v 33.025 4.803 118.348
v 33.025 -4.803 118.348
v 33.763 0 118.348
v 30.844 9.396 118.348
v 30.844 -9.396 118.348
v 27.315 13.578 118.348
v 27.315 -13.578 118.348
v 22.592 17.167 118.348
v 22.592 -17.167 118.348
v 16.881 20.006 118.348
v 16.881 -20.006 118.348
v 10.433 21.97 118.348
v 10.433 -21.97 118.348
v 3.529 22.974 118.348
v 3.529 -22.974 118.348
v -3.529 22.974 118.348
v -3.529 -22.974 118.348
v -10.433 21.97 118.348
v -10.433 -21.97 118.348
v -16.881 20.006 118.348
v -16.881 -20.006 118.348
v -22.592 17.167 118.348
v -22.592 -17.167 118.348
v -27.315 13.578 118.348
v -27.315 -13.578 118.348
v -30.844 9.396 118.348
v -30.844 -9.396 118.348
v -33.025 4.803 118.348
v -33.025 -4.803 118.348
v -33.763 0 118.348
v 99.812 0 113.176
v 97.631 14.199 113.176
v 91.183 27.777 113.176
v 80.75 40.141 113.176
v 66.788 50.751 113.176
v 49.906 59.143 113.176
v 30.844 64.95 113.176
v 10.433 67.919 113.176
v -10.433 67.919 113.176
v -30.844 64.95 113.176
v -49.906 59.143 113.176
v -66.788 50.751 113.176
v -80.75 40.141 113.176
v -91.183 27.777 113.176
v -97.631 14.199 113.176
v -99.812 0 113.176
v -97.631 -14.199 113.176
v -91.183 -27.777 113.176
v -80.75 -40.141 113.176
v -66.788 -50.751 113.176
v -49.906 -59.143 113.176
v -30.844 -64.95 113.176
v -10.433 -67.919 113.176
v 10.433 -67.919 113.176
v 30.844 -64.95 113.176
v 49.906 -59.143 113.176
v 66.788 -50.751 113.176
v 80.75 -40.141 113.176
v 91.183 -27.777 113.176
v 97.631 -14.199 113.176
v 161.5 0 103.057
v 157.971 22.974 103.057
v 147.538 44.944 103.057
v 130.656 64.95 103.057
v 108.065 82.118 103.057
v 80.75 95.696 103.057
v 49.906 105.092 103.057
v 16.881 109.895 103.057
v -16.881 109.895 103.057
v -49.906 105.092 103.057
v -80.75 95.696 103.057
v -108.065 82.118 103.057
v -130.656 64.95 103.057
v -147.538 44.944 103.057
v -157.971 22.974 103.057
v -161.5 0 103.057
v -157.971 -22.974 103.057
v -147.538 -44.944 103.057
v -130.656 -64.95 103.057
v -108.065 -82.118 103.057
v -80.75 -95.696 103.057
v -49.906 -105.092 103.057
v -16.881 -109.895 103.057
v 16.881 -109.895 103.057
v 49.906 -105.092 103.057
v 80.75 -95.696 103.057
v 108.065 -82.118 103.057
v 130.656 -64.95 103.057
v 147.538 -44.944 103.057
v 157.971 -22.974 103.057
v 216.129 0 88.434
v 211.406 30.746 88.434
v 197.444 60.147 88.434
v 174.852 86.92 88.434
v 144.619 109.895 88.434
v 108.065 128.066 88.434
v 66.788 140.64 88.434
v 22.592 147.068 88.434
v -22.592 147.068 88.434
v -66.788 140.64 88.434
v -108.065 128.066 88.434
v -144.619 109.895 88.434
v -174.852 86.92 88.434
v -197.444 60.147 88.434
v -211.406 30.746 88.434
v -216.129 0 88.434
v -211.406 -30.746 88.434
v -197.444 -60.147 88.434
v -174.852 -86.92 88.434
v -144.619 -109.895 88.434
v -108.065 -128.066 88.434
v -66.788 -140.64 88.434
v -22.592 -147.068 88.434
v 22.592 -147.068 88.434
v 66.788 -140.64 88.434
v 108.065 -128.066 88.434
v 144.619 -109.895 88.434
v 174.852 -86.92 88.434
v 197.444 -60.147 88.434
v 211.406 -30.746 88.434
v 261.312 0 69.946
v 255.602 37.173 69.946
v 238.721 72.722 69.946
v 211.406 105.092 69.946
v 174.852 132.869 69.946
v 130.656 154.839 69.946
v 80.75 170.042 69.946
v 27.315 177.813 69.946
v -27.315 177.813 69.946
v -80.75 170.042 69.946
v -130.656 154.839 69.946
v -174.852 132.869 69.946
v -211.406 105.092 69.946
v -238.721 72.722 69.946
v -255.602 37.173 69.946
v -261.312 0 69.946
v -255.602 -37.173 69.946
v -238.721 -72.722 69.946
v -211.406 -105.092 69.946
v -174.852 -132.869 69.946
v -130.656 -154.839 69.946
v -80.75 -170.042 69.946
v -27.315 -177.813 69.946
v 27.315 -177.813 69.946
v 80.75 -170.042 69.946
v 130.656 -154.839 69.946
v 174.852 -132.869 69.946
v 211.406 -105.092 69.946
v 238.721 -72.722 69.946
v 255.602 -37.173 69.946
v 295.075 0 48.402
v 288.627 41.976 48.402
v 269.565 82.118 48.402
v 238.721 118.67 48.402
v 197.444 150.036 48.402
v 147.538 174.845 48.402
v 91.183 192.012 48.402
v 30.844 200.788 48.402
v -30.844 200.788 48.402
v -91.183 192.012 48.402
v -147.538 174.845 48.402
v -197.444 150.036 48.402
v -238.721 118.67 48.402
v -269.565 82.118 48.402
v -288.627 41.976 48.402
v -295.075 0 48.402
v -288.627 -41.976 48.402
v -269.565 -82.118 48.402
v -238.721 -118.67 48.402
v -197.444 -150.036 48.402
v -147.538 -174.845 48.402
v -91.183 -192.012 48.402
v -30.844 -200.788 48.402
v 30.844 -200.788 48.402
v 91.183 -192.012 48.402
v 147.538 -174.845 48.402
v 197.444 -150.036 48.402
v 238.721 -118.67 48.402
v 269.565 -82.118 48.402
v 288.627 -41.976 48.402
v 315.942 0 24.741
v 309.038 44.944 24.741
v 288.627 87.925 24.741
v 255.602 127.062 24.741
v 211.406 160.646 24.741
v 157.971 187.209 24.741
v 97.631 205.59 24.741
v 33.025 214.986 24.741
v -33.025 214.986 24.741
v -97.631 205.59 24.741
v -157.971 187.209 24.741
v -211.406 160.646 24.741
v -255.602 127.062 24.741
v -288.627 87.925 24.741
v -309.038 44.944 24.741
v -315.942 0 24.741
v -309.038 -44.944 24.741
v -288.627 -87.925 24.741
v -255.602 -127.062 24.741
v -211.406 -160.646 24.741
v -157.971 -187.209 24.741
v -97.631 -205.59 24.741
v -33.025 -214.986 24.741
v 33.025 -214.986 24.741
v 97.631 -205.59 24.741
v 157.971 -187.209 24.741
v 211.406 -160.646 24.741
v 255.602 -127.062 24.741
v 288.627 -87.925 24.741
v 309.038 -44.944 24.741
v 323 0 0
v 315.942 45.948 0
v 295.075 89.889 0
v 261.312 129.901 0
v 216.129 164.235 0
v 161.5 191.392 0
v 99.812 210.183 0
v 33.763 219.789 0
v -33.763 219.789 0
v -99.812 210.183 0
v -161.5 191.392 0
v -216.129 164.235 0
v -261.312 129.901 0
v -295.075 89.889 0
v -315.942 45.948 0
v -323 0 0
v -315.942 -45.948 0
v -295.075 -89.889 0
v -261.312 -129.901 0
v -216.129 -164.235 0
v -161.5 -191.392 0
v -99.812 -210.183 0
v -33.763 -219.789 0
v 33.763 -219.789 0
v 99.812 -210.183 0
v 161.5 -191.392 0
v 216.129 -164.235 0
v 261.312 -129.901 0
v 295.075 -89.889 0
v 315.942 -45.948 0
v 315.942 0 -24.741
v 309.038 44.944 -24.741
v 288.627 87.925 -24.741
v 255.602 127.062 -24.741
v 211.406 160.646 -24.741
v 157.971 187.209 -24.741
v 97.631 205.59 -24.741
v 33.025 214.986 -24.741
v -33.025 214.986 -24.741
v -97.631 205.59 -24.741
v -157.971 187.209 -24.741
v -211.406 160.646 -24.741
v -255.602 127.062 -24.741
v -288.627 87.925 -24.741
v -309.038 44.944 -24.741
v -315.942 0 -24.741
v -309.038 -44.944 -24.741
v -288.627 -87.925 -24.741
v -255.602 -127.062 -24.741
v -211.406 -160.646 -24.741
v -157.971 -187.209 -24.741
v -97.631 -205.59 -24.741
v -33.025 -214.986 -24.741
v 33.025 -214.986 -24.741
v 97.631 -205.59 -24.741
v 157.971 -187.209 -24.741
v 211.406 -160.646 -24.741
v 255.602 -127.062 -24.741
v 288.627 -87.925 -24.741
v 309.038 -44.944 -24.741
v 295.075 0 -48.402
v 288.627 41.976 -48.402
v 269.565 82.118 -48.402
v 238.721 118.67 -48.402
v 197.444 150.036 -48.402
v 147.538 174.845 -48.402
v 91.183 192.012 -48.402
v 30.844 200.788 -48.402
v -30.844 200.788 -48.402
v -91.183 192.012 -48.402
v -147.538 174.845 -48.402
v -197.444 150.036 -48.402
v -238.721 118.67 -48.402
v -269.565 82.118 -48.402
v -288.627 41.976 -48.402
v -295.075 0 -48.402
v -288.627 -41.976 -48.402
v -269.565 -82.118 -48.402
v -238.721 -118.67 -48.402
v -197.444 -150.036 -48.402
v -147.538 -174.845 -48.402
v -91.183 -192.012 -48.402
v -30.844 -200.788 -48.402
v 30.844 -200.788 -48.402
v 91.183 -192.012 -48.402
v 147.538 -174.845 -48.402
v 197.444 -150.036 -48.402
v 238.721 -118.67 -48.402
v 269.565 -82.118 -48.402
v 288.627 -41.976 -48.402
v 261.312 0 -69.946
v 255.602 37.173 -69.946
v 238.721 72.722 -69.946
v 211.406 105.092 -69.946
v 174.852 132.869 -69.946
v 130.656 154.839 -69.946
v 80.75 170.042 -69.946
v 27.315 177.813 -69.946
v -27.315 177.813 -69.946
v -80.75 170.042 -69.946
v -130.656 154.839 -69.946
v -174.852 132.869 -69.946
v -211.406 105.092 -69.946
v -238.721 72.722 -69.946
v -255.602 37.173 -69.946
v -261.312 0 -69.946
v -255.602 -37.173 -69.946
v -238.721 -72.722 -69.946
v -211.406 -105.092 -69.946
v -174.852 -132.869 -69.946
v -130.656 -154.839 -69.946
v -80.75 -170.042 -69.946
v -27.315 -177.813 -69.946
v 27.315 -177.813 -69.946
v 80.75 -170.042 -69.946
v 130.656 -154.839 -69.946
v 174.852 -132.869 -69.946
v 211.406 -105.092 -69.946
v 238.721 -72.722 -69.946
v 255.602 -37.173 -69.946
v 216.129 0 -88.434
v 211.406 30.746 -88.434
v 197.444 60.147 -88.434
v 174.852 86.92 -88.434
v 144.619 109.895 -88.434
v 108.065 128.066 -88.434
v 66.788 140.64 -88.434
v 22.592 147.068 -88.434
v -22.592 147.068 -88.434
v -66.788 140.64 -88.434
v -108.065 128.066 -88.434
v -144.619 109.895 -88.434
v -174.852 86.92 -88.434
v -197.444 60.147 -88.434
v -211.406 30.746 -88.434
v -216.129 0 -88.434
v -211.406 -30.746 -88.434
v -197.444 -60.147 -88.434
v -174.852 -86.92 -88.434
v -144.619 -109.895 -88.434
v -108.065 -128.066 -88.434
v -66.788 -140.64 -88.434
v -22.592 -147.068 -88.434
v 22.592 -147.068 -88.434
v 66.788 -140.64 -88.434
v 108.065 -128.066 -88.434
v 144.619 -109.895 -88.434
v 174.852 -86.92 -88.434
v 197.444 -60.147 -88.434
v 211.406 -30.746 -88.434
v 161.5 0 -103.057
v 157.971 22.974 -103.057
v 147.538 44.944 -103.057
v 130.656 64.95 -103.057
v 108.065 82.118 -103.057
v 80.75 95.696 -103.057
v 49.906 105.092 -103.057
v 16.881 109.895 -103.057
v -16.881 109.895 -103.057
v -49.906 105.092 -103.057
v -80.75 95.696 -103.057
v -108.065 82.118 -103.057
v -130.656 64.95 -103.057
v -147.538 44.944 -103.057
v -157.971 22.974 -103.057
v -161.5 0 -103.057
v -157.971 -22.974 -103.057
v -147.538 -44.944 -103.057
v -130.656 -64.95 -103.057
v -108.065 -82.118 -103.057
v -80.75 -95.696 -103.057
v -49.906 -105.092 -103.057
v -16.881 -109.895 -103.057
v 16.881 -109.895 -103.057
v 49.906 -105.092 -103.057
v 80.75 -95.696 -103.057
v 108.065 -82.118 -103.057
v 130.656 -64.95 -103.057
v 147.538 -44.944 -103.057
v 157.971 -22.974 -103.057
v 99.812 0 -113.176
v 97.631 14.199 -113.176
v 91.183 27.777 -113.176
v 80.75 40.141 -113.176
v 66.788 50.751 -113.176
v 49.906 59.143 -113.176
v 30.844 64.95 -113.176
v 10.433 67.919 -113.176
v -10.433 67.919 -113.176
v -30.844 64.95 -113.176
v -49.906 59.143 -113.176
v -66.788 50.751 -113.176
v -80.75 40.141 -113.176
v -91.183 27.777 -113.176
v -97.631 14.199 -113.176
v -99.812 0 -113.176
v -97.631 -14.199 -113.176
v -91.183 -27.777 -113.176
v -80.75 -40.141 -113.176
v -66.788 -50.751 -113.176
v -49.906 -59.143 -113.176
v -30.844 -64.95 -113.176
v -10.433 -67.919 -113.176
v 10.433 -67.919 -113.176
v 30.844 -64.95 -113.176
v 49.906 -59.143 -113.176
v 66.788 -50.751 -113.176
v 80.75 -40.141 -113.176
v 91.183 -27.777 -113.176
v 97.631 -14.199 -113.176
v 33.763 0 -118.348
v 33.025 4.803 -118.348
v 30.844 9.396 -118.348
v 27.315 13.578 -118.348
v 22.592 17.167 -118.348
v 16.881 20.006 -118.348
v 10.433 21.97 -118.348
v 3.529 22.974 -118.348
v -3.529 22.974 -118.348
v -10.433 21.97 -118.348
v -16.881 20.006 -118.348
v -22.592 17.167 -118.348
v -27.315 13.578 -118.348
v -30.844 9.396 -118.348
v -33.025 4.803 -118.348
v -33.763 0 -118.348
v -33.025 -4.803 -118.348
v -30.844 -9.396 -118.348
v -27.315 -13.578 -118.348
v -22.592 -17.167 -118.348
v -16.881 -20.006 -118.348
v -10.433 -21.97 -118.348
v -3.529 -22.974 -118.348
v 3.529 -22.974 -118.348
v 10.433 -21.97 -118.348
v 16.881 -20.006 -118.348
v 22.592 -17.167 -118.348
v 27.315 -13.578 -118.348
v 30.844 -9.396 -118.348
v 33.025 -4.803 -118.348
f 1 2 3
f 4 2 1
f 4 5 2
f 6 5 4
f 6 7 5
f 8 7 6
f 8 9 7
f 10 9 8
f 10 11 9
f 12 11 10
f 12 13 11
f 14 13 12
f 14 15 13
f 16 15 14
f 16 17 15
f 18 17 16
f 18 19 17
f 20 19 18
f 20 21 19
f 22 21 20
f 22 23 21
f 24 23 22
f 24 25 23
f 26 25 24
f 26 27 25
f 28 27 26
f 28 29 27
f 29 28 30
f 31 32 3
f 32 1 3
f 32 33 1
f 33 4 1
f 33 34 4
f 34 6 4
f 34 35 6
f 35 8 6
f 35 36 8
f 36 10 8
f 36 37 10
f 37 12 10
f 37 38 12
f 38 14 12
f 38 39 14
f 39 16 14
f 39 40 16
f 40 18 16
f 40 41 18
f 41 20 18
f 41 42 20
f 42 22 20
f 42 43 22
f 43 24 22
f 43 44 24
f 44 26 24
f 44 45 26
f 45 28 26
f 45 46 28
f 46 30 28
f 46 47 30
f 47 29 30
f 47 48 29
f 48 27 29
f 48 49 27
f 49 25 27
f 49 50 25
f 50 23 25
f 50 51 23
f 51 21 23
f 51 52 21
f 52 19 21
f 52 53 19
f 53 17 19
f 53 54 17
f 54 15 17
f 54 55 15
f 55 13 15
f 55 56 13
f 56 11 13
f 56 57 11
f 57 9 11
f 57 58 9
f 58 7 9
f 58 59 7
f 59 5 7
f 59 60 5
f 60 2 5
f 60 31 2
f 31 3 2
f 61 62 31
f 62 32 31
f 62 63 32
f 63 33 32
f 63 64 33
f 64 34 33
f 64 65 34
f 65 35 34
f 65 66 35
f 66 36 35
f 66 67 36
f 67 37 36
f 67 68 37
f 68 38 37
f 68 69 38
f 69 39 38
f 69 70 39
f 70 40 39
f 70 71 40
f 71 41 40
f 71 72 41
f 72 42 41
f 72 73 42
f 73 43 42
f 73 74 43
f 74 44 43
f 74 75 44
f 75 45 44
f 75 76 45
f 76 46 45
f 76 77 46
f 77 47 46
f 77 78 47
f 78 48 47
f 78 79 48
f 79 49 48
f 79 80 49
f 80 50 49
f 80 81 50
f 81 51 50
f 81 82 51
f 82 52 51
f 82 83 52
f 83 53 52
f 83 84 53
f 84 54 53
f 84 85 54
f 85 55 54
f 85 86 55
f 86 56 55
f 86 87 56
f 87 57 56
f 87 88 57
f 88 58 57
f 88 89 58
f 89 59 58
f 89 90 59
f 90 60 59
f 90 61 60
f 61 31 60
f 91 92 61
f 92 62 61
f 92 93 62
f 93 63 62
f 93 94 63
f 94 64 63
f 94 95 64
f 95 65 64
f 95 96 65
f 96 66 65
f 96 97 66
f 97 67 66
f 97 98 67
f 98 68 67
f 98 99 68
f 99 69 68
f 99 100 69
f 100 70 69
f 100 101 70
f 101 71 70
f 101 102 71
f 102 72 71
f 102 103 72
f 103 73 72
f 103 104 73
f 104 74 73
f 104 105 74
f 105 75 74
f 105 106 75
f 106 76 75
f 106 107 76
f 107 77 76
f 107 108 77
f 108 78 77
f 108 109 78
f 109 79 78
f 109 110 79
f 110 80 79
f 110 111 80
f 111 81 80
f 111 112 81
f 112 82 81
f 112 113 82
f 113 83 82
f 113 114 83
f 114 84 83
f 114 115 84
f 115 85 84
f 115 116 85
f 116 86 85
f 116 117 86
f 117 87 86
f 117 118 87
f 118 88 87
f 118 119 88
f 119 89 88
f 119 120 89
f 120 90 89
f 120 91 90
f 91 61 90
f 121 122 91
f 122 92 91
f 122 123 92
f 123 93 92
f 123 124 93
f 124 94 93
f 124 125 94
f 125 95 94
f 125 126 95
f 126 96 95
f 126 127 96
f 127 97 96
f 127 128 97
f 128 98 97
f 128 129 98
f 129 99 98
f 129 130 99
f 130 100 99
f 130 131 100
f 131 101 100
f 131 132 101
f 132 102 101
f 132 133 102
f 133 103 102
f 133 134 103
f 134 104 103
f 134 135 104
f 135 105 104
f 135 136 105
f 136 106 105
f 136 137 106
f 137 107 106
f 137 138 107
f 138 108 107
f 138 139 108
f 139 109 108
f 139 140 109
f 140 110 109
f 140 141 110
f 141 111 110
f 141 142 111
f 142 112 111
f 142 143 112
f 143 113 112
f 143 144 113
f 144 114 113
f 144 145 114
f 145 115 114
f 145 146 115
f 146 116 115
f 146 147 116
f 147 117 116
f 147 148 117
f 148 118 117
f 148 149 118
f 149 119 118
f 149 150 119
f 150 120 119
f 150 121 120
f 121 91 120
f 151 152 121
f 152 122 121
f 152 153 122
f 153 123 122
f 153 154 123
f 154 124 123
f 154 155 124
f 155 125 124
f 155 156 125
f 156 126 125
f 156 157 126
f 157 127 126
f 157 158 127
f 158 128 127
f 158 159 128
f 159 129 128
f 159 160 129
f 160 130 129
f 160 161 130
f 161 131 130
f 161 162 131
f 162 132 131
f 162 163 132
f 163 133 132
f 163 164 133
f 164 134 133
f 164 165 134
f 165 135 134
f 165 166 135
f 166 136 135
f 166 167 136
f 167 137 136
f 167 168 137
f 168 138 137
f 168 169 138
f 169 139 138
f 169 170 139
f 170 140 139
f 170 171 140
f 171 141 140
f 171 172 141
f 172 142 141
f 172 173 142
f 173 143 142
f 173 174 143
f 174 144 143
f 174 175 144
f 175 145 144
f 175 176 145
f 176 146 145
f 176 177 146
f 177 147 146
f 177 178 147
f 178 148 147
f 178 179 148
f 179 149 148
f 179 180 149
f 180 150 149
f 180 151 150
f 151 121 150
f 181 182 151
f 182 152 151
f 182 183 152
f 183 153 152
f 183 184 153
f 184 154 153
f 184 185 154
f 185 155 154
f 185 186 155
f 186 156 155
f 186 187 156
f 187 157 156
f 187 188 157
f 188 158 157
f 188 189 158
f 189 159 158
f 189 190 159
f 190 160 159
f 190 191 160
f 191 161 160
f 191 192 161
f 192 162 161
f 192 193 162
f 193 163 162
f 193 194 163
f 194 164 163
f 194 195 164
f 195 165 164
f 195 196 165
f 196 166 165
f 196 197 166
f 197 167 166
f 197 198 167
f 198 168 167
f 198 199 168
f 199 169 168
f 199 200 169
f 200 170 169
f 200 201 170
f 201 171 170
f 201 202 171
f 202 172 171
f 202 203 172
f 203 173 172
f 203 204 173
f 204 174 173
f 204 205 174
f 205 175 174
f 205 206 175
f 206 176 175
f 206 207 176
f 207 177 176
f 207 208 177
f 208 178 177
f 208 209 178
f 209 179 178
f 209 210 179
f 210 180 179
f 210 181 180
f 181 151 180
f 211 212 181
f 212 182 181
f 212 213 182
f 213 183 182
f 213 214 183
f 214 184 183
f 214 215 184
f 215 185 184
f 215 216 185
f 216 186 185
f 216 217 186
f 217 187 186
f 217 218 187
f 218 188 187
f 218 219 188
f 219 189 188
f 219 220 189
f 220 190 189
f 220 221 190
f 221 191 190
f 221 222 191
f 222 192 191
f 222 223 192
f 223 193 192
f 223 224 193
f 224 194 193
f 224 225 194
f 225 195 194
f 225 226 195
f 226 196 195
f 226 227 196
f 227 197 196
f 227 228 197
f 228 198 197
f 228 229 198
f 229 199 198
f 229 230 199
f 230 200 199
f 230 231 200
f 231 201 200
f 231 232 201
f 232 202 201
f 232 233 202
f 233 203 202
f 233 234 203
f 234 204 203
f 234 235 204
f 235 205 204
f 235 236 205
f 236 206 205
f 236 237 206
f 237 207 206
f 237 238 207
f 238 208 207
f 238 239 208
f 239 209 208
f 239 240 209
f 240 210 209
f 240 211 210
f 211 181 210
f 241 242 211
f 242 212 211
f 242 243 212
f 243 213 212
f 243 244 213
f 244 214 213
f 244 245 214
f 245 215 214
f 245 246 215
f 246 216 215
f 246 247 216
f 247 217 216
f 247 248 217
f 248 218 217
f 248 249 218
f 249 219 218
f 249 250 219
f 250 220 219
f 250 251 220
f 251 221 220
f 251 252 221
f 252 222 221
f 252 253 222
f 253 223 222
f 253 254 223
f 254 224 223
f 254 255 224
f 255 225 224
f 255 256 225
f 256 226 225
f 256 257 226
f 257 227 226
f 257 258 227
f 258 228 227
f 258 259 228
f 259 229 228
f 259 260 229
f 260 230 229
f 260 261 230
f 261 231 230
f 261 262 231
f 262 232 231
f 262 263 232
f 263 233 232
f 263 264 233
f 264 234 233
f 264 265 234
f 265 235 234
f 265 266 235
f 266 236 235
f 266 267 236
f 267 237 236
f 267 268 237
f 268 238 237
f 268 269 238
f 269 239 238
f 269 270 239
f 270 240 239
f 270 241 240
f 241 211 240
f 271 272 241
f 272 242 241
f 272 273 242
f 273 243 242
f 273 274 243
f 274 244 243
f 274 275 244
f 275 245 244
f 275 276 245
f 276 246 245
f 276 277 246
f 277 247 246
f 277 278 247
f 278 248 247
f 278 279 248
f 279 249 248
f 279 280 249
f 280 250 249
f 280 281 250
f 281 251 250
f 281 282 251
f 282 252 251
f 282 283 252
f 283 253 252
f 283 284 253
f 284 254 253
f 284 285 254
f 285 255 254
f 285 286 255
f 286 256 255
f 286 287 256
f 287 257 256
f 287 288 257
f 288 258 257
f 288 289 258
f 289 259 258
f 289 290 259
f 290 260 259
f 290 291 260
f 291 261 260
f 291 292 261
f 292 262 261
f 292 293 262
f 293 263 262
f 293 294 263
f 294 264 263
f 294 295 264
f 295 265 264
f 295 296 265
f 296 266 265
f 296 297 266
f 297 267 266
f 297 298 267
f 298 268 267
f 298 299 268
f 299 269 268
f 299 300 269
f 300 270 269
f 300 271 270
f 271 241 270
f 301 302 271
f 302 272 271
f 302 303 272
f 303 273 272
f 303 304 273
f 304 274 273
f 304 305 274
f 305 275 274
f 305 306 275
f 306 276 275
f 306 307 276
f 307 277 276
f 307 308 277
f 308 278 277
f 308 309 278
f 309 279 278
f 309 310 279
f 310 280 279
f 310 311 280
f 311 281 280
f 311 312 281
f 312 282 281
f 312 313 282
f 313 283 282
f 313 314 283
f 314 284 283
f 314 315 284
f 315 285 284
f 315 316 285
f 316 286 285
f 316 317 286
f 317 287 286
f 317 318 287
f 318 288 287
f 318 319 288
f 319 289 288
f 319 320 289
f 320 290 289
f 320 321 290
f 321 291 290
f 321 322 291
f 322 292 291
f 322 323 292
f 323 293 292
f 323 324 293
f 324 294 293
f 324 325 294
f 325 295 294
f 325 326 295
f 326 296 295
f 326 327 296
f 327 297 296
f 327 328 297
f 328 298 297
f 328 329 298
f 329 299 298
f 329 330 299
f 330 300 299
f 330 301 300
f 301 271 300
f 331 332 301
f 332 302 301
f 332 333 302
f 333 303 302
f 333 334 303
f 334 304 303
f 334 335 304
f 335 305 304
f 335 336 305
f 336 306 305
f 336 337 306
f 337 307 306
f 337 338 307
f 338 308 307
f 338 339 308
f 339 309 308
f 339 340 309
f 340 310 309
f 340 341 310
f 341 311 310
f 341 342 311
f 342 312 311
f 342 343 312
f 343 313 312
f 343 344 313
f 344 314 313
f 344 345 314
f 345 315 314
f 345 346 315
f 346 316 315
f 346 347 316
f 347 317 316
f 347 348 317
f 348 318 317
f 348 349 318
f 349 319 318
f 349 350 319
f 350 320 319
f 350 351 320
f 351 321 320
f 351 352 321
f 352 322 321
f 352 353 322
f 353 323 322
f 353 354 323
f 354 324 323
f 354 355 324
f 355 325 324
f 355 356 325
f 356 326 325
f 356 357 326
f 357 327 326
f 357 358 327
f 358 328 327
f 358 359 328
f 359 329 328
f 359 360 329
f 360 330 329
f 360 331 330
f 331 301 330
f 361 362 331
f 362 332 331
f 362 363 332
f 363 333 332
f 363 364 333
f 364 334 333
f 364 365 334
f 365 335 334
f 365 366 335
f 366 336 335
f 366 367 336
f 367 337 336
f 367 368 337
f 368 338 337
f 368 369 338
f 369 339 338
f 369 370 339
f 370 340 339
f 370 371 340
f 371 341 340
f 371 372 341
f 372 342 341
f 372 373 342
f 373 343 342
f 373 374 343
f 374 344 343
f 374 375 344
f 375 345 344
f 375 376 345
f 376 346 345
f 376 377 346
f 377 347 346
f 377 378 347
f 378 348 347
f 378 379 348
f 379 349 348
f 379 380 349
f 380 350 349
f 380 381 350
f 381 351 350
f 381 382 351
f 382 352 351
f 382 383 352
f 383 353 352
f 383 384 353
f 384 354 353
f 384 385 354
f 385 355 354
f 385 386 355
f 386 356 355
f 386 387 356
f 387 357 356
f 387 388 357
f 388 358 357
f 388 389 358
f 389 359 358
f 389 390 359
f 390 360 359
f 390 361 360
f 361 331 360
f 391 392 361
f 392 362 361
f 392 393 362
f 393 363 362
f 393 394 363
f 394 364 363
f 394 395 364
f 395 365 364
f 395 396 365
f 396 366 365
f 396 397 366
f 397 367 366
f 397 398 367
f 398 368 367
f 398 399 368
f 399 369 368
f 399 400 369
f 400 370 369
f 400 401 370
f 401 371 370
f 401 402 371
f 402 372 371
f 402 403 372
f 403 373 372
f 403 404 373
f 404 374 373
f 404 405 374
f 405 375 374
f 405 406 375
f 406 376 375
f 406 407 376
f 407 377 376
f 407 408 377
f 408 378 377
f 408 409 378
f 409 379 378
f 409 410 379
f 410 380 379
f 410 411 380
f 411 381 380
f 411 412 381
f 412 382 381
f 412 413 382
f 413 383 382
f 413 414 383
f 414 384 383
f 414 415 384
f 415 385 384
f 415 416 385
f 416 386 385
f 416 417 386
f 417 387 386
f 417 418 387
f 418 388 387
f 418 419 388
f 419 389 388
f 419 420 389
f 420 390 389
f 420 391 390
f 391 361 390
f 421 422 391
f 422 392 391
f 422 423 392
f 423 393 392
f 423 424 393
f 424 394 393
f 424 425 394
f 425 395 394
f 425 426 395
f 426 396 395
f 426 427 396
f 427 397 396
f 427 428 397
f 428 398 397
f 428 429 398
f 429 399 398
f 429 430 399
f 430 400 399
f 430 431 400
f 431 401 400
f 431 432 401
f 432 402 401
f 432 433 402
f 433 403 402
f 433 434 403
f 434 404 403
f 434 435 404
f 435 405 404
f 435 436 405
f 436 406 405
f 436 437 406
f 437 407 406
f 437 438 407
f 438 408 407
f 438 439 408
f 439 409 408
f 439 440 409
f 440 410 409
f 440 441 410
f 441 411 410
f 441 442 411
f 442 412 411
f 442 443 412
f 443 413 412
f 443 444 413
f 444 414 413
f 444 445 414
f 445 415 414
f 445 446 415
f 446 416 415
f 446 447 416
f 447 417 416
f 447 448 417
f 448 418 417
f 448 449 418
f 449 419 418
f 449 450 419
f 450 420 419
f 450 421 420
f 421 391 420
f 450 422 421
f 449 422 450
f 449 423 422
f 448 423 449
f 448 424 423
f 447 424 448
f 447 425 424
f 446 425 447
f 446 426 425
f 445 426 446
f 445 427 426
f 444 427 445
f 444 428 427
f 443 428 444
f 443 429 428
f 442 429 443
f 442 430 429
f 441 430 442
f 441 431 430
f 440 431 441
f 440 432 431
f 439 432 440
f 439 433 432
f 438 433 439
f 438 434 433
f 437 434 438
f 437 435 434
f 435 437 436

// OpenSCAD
// Generated by SolidPython 1.0.1 on 2020-07-29 00:46:54


scale(v = [19, 13, 7]) {
	sphere(r = 17);
}
/***********************************************
*********      SolidPython code:      **********
************************************************
 
# import packages: SolidPython
from solid import *
from solid.utils import *
from itertools import chain, combinations, permutations


class Resize:

    def __init__(self, scad_file):
        self.scad_file = scad_file
        #self.scad_file = import_scad(scad_file)
        # cone/cylinder param:
        self.r1 = 0
        self.r2 = 0
        self.h = 0
        # rectangular prism param:
        self.w = 0
        self.l = 0
        # ellipse param:
        self.r = 0

    # import OpenScad code (file name corresponds to shape)


    # classify shape + parameters
    def assign(self, param1, param2, param3):
        if self.scad_file == 'cone.scad':
            self.r1 = param1
            self.r2 = param2
            self.h = param3
        elif self.scad_file == 'cylinder.scad':
            self.r1 = param1
            self.r2 = param2
            self.h = param3
        elif self.scad_file == 'rectangularPrism.scad':
            self.h = param1
            self.l = param2
            self.w = param3
        else:
            self.r = param1
            self.h = param2

    # resize parameters
    def iterate(self):
        x = range(3, 20, 2)
        i = 1
        if self.scad_file == 'cone.scad':
            tempList = list(permutations(x, 2))
            for temp in tempList:
                param1 = temp[0]
                param2 = temp[1]
                filepath = 'produced_scad_files/' + 'cone' + str(param1) + '_' + str(param2) + '_' + '.scad'
                scad_render_to_file(cylinder(h=param1, r1=param2, r2=0), filepath)

        elif self.scad_file == 'cylinder.scad':
            tempList = list(permutations(x, 3))
            for temp in tempList:
                param1 = temp[0]
                param2 = temp[1]
                filepath = 'produced_scad_files/' + 'cylinder' + str(param1) + '_' + str(param2) + '_' + '.scad'
                scad_render_to_file(cylinder(h=param1, r1=param2, r2=param2), filepath)

        elif self.scad_file == 'rectangularPrism.scad':
            tempList = list(permutations(x, 3))
            for temp in tempList:
                param1 = temp[0]
                param2 = temp[1]
                param3 = temp[2]
                filepath = 'produced_scad_files/' + 'rectangularPrism' + str(param1) + '_' + str(param2) + '_' + str(
                    param3) + '.scad'
                scad_render_to_file(cube(size=(param1, param2, param3)), filepath)

        elif self.scad_file == 'ellipse.scad':
            tempList = list(permutations(x, 4))
            for temp in tempList:
                param1 = temp[0]
                param2 = temp[1]
                param3 = temp[2]
                param4 = temp[3]
                filepath = 'produced_scad_files/' + 'ellipse' + str(param1) + '_' + str(param2) + '_' + str(param3) + '_' + str(param4) + '.scad'
                scad_render_to_file(scale([param1, param2, param3])(sphere(r=param4)), filepath)

    def render_to_scadfile(self):
        scad_render_to_file(scad, 'example.scad') 
 
************************************************/
